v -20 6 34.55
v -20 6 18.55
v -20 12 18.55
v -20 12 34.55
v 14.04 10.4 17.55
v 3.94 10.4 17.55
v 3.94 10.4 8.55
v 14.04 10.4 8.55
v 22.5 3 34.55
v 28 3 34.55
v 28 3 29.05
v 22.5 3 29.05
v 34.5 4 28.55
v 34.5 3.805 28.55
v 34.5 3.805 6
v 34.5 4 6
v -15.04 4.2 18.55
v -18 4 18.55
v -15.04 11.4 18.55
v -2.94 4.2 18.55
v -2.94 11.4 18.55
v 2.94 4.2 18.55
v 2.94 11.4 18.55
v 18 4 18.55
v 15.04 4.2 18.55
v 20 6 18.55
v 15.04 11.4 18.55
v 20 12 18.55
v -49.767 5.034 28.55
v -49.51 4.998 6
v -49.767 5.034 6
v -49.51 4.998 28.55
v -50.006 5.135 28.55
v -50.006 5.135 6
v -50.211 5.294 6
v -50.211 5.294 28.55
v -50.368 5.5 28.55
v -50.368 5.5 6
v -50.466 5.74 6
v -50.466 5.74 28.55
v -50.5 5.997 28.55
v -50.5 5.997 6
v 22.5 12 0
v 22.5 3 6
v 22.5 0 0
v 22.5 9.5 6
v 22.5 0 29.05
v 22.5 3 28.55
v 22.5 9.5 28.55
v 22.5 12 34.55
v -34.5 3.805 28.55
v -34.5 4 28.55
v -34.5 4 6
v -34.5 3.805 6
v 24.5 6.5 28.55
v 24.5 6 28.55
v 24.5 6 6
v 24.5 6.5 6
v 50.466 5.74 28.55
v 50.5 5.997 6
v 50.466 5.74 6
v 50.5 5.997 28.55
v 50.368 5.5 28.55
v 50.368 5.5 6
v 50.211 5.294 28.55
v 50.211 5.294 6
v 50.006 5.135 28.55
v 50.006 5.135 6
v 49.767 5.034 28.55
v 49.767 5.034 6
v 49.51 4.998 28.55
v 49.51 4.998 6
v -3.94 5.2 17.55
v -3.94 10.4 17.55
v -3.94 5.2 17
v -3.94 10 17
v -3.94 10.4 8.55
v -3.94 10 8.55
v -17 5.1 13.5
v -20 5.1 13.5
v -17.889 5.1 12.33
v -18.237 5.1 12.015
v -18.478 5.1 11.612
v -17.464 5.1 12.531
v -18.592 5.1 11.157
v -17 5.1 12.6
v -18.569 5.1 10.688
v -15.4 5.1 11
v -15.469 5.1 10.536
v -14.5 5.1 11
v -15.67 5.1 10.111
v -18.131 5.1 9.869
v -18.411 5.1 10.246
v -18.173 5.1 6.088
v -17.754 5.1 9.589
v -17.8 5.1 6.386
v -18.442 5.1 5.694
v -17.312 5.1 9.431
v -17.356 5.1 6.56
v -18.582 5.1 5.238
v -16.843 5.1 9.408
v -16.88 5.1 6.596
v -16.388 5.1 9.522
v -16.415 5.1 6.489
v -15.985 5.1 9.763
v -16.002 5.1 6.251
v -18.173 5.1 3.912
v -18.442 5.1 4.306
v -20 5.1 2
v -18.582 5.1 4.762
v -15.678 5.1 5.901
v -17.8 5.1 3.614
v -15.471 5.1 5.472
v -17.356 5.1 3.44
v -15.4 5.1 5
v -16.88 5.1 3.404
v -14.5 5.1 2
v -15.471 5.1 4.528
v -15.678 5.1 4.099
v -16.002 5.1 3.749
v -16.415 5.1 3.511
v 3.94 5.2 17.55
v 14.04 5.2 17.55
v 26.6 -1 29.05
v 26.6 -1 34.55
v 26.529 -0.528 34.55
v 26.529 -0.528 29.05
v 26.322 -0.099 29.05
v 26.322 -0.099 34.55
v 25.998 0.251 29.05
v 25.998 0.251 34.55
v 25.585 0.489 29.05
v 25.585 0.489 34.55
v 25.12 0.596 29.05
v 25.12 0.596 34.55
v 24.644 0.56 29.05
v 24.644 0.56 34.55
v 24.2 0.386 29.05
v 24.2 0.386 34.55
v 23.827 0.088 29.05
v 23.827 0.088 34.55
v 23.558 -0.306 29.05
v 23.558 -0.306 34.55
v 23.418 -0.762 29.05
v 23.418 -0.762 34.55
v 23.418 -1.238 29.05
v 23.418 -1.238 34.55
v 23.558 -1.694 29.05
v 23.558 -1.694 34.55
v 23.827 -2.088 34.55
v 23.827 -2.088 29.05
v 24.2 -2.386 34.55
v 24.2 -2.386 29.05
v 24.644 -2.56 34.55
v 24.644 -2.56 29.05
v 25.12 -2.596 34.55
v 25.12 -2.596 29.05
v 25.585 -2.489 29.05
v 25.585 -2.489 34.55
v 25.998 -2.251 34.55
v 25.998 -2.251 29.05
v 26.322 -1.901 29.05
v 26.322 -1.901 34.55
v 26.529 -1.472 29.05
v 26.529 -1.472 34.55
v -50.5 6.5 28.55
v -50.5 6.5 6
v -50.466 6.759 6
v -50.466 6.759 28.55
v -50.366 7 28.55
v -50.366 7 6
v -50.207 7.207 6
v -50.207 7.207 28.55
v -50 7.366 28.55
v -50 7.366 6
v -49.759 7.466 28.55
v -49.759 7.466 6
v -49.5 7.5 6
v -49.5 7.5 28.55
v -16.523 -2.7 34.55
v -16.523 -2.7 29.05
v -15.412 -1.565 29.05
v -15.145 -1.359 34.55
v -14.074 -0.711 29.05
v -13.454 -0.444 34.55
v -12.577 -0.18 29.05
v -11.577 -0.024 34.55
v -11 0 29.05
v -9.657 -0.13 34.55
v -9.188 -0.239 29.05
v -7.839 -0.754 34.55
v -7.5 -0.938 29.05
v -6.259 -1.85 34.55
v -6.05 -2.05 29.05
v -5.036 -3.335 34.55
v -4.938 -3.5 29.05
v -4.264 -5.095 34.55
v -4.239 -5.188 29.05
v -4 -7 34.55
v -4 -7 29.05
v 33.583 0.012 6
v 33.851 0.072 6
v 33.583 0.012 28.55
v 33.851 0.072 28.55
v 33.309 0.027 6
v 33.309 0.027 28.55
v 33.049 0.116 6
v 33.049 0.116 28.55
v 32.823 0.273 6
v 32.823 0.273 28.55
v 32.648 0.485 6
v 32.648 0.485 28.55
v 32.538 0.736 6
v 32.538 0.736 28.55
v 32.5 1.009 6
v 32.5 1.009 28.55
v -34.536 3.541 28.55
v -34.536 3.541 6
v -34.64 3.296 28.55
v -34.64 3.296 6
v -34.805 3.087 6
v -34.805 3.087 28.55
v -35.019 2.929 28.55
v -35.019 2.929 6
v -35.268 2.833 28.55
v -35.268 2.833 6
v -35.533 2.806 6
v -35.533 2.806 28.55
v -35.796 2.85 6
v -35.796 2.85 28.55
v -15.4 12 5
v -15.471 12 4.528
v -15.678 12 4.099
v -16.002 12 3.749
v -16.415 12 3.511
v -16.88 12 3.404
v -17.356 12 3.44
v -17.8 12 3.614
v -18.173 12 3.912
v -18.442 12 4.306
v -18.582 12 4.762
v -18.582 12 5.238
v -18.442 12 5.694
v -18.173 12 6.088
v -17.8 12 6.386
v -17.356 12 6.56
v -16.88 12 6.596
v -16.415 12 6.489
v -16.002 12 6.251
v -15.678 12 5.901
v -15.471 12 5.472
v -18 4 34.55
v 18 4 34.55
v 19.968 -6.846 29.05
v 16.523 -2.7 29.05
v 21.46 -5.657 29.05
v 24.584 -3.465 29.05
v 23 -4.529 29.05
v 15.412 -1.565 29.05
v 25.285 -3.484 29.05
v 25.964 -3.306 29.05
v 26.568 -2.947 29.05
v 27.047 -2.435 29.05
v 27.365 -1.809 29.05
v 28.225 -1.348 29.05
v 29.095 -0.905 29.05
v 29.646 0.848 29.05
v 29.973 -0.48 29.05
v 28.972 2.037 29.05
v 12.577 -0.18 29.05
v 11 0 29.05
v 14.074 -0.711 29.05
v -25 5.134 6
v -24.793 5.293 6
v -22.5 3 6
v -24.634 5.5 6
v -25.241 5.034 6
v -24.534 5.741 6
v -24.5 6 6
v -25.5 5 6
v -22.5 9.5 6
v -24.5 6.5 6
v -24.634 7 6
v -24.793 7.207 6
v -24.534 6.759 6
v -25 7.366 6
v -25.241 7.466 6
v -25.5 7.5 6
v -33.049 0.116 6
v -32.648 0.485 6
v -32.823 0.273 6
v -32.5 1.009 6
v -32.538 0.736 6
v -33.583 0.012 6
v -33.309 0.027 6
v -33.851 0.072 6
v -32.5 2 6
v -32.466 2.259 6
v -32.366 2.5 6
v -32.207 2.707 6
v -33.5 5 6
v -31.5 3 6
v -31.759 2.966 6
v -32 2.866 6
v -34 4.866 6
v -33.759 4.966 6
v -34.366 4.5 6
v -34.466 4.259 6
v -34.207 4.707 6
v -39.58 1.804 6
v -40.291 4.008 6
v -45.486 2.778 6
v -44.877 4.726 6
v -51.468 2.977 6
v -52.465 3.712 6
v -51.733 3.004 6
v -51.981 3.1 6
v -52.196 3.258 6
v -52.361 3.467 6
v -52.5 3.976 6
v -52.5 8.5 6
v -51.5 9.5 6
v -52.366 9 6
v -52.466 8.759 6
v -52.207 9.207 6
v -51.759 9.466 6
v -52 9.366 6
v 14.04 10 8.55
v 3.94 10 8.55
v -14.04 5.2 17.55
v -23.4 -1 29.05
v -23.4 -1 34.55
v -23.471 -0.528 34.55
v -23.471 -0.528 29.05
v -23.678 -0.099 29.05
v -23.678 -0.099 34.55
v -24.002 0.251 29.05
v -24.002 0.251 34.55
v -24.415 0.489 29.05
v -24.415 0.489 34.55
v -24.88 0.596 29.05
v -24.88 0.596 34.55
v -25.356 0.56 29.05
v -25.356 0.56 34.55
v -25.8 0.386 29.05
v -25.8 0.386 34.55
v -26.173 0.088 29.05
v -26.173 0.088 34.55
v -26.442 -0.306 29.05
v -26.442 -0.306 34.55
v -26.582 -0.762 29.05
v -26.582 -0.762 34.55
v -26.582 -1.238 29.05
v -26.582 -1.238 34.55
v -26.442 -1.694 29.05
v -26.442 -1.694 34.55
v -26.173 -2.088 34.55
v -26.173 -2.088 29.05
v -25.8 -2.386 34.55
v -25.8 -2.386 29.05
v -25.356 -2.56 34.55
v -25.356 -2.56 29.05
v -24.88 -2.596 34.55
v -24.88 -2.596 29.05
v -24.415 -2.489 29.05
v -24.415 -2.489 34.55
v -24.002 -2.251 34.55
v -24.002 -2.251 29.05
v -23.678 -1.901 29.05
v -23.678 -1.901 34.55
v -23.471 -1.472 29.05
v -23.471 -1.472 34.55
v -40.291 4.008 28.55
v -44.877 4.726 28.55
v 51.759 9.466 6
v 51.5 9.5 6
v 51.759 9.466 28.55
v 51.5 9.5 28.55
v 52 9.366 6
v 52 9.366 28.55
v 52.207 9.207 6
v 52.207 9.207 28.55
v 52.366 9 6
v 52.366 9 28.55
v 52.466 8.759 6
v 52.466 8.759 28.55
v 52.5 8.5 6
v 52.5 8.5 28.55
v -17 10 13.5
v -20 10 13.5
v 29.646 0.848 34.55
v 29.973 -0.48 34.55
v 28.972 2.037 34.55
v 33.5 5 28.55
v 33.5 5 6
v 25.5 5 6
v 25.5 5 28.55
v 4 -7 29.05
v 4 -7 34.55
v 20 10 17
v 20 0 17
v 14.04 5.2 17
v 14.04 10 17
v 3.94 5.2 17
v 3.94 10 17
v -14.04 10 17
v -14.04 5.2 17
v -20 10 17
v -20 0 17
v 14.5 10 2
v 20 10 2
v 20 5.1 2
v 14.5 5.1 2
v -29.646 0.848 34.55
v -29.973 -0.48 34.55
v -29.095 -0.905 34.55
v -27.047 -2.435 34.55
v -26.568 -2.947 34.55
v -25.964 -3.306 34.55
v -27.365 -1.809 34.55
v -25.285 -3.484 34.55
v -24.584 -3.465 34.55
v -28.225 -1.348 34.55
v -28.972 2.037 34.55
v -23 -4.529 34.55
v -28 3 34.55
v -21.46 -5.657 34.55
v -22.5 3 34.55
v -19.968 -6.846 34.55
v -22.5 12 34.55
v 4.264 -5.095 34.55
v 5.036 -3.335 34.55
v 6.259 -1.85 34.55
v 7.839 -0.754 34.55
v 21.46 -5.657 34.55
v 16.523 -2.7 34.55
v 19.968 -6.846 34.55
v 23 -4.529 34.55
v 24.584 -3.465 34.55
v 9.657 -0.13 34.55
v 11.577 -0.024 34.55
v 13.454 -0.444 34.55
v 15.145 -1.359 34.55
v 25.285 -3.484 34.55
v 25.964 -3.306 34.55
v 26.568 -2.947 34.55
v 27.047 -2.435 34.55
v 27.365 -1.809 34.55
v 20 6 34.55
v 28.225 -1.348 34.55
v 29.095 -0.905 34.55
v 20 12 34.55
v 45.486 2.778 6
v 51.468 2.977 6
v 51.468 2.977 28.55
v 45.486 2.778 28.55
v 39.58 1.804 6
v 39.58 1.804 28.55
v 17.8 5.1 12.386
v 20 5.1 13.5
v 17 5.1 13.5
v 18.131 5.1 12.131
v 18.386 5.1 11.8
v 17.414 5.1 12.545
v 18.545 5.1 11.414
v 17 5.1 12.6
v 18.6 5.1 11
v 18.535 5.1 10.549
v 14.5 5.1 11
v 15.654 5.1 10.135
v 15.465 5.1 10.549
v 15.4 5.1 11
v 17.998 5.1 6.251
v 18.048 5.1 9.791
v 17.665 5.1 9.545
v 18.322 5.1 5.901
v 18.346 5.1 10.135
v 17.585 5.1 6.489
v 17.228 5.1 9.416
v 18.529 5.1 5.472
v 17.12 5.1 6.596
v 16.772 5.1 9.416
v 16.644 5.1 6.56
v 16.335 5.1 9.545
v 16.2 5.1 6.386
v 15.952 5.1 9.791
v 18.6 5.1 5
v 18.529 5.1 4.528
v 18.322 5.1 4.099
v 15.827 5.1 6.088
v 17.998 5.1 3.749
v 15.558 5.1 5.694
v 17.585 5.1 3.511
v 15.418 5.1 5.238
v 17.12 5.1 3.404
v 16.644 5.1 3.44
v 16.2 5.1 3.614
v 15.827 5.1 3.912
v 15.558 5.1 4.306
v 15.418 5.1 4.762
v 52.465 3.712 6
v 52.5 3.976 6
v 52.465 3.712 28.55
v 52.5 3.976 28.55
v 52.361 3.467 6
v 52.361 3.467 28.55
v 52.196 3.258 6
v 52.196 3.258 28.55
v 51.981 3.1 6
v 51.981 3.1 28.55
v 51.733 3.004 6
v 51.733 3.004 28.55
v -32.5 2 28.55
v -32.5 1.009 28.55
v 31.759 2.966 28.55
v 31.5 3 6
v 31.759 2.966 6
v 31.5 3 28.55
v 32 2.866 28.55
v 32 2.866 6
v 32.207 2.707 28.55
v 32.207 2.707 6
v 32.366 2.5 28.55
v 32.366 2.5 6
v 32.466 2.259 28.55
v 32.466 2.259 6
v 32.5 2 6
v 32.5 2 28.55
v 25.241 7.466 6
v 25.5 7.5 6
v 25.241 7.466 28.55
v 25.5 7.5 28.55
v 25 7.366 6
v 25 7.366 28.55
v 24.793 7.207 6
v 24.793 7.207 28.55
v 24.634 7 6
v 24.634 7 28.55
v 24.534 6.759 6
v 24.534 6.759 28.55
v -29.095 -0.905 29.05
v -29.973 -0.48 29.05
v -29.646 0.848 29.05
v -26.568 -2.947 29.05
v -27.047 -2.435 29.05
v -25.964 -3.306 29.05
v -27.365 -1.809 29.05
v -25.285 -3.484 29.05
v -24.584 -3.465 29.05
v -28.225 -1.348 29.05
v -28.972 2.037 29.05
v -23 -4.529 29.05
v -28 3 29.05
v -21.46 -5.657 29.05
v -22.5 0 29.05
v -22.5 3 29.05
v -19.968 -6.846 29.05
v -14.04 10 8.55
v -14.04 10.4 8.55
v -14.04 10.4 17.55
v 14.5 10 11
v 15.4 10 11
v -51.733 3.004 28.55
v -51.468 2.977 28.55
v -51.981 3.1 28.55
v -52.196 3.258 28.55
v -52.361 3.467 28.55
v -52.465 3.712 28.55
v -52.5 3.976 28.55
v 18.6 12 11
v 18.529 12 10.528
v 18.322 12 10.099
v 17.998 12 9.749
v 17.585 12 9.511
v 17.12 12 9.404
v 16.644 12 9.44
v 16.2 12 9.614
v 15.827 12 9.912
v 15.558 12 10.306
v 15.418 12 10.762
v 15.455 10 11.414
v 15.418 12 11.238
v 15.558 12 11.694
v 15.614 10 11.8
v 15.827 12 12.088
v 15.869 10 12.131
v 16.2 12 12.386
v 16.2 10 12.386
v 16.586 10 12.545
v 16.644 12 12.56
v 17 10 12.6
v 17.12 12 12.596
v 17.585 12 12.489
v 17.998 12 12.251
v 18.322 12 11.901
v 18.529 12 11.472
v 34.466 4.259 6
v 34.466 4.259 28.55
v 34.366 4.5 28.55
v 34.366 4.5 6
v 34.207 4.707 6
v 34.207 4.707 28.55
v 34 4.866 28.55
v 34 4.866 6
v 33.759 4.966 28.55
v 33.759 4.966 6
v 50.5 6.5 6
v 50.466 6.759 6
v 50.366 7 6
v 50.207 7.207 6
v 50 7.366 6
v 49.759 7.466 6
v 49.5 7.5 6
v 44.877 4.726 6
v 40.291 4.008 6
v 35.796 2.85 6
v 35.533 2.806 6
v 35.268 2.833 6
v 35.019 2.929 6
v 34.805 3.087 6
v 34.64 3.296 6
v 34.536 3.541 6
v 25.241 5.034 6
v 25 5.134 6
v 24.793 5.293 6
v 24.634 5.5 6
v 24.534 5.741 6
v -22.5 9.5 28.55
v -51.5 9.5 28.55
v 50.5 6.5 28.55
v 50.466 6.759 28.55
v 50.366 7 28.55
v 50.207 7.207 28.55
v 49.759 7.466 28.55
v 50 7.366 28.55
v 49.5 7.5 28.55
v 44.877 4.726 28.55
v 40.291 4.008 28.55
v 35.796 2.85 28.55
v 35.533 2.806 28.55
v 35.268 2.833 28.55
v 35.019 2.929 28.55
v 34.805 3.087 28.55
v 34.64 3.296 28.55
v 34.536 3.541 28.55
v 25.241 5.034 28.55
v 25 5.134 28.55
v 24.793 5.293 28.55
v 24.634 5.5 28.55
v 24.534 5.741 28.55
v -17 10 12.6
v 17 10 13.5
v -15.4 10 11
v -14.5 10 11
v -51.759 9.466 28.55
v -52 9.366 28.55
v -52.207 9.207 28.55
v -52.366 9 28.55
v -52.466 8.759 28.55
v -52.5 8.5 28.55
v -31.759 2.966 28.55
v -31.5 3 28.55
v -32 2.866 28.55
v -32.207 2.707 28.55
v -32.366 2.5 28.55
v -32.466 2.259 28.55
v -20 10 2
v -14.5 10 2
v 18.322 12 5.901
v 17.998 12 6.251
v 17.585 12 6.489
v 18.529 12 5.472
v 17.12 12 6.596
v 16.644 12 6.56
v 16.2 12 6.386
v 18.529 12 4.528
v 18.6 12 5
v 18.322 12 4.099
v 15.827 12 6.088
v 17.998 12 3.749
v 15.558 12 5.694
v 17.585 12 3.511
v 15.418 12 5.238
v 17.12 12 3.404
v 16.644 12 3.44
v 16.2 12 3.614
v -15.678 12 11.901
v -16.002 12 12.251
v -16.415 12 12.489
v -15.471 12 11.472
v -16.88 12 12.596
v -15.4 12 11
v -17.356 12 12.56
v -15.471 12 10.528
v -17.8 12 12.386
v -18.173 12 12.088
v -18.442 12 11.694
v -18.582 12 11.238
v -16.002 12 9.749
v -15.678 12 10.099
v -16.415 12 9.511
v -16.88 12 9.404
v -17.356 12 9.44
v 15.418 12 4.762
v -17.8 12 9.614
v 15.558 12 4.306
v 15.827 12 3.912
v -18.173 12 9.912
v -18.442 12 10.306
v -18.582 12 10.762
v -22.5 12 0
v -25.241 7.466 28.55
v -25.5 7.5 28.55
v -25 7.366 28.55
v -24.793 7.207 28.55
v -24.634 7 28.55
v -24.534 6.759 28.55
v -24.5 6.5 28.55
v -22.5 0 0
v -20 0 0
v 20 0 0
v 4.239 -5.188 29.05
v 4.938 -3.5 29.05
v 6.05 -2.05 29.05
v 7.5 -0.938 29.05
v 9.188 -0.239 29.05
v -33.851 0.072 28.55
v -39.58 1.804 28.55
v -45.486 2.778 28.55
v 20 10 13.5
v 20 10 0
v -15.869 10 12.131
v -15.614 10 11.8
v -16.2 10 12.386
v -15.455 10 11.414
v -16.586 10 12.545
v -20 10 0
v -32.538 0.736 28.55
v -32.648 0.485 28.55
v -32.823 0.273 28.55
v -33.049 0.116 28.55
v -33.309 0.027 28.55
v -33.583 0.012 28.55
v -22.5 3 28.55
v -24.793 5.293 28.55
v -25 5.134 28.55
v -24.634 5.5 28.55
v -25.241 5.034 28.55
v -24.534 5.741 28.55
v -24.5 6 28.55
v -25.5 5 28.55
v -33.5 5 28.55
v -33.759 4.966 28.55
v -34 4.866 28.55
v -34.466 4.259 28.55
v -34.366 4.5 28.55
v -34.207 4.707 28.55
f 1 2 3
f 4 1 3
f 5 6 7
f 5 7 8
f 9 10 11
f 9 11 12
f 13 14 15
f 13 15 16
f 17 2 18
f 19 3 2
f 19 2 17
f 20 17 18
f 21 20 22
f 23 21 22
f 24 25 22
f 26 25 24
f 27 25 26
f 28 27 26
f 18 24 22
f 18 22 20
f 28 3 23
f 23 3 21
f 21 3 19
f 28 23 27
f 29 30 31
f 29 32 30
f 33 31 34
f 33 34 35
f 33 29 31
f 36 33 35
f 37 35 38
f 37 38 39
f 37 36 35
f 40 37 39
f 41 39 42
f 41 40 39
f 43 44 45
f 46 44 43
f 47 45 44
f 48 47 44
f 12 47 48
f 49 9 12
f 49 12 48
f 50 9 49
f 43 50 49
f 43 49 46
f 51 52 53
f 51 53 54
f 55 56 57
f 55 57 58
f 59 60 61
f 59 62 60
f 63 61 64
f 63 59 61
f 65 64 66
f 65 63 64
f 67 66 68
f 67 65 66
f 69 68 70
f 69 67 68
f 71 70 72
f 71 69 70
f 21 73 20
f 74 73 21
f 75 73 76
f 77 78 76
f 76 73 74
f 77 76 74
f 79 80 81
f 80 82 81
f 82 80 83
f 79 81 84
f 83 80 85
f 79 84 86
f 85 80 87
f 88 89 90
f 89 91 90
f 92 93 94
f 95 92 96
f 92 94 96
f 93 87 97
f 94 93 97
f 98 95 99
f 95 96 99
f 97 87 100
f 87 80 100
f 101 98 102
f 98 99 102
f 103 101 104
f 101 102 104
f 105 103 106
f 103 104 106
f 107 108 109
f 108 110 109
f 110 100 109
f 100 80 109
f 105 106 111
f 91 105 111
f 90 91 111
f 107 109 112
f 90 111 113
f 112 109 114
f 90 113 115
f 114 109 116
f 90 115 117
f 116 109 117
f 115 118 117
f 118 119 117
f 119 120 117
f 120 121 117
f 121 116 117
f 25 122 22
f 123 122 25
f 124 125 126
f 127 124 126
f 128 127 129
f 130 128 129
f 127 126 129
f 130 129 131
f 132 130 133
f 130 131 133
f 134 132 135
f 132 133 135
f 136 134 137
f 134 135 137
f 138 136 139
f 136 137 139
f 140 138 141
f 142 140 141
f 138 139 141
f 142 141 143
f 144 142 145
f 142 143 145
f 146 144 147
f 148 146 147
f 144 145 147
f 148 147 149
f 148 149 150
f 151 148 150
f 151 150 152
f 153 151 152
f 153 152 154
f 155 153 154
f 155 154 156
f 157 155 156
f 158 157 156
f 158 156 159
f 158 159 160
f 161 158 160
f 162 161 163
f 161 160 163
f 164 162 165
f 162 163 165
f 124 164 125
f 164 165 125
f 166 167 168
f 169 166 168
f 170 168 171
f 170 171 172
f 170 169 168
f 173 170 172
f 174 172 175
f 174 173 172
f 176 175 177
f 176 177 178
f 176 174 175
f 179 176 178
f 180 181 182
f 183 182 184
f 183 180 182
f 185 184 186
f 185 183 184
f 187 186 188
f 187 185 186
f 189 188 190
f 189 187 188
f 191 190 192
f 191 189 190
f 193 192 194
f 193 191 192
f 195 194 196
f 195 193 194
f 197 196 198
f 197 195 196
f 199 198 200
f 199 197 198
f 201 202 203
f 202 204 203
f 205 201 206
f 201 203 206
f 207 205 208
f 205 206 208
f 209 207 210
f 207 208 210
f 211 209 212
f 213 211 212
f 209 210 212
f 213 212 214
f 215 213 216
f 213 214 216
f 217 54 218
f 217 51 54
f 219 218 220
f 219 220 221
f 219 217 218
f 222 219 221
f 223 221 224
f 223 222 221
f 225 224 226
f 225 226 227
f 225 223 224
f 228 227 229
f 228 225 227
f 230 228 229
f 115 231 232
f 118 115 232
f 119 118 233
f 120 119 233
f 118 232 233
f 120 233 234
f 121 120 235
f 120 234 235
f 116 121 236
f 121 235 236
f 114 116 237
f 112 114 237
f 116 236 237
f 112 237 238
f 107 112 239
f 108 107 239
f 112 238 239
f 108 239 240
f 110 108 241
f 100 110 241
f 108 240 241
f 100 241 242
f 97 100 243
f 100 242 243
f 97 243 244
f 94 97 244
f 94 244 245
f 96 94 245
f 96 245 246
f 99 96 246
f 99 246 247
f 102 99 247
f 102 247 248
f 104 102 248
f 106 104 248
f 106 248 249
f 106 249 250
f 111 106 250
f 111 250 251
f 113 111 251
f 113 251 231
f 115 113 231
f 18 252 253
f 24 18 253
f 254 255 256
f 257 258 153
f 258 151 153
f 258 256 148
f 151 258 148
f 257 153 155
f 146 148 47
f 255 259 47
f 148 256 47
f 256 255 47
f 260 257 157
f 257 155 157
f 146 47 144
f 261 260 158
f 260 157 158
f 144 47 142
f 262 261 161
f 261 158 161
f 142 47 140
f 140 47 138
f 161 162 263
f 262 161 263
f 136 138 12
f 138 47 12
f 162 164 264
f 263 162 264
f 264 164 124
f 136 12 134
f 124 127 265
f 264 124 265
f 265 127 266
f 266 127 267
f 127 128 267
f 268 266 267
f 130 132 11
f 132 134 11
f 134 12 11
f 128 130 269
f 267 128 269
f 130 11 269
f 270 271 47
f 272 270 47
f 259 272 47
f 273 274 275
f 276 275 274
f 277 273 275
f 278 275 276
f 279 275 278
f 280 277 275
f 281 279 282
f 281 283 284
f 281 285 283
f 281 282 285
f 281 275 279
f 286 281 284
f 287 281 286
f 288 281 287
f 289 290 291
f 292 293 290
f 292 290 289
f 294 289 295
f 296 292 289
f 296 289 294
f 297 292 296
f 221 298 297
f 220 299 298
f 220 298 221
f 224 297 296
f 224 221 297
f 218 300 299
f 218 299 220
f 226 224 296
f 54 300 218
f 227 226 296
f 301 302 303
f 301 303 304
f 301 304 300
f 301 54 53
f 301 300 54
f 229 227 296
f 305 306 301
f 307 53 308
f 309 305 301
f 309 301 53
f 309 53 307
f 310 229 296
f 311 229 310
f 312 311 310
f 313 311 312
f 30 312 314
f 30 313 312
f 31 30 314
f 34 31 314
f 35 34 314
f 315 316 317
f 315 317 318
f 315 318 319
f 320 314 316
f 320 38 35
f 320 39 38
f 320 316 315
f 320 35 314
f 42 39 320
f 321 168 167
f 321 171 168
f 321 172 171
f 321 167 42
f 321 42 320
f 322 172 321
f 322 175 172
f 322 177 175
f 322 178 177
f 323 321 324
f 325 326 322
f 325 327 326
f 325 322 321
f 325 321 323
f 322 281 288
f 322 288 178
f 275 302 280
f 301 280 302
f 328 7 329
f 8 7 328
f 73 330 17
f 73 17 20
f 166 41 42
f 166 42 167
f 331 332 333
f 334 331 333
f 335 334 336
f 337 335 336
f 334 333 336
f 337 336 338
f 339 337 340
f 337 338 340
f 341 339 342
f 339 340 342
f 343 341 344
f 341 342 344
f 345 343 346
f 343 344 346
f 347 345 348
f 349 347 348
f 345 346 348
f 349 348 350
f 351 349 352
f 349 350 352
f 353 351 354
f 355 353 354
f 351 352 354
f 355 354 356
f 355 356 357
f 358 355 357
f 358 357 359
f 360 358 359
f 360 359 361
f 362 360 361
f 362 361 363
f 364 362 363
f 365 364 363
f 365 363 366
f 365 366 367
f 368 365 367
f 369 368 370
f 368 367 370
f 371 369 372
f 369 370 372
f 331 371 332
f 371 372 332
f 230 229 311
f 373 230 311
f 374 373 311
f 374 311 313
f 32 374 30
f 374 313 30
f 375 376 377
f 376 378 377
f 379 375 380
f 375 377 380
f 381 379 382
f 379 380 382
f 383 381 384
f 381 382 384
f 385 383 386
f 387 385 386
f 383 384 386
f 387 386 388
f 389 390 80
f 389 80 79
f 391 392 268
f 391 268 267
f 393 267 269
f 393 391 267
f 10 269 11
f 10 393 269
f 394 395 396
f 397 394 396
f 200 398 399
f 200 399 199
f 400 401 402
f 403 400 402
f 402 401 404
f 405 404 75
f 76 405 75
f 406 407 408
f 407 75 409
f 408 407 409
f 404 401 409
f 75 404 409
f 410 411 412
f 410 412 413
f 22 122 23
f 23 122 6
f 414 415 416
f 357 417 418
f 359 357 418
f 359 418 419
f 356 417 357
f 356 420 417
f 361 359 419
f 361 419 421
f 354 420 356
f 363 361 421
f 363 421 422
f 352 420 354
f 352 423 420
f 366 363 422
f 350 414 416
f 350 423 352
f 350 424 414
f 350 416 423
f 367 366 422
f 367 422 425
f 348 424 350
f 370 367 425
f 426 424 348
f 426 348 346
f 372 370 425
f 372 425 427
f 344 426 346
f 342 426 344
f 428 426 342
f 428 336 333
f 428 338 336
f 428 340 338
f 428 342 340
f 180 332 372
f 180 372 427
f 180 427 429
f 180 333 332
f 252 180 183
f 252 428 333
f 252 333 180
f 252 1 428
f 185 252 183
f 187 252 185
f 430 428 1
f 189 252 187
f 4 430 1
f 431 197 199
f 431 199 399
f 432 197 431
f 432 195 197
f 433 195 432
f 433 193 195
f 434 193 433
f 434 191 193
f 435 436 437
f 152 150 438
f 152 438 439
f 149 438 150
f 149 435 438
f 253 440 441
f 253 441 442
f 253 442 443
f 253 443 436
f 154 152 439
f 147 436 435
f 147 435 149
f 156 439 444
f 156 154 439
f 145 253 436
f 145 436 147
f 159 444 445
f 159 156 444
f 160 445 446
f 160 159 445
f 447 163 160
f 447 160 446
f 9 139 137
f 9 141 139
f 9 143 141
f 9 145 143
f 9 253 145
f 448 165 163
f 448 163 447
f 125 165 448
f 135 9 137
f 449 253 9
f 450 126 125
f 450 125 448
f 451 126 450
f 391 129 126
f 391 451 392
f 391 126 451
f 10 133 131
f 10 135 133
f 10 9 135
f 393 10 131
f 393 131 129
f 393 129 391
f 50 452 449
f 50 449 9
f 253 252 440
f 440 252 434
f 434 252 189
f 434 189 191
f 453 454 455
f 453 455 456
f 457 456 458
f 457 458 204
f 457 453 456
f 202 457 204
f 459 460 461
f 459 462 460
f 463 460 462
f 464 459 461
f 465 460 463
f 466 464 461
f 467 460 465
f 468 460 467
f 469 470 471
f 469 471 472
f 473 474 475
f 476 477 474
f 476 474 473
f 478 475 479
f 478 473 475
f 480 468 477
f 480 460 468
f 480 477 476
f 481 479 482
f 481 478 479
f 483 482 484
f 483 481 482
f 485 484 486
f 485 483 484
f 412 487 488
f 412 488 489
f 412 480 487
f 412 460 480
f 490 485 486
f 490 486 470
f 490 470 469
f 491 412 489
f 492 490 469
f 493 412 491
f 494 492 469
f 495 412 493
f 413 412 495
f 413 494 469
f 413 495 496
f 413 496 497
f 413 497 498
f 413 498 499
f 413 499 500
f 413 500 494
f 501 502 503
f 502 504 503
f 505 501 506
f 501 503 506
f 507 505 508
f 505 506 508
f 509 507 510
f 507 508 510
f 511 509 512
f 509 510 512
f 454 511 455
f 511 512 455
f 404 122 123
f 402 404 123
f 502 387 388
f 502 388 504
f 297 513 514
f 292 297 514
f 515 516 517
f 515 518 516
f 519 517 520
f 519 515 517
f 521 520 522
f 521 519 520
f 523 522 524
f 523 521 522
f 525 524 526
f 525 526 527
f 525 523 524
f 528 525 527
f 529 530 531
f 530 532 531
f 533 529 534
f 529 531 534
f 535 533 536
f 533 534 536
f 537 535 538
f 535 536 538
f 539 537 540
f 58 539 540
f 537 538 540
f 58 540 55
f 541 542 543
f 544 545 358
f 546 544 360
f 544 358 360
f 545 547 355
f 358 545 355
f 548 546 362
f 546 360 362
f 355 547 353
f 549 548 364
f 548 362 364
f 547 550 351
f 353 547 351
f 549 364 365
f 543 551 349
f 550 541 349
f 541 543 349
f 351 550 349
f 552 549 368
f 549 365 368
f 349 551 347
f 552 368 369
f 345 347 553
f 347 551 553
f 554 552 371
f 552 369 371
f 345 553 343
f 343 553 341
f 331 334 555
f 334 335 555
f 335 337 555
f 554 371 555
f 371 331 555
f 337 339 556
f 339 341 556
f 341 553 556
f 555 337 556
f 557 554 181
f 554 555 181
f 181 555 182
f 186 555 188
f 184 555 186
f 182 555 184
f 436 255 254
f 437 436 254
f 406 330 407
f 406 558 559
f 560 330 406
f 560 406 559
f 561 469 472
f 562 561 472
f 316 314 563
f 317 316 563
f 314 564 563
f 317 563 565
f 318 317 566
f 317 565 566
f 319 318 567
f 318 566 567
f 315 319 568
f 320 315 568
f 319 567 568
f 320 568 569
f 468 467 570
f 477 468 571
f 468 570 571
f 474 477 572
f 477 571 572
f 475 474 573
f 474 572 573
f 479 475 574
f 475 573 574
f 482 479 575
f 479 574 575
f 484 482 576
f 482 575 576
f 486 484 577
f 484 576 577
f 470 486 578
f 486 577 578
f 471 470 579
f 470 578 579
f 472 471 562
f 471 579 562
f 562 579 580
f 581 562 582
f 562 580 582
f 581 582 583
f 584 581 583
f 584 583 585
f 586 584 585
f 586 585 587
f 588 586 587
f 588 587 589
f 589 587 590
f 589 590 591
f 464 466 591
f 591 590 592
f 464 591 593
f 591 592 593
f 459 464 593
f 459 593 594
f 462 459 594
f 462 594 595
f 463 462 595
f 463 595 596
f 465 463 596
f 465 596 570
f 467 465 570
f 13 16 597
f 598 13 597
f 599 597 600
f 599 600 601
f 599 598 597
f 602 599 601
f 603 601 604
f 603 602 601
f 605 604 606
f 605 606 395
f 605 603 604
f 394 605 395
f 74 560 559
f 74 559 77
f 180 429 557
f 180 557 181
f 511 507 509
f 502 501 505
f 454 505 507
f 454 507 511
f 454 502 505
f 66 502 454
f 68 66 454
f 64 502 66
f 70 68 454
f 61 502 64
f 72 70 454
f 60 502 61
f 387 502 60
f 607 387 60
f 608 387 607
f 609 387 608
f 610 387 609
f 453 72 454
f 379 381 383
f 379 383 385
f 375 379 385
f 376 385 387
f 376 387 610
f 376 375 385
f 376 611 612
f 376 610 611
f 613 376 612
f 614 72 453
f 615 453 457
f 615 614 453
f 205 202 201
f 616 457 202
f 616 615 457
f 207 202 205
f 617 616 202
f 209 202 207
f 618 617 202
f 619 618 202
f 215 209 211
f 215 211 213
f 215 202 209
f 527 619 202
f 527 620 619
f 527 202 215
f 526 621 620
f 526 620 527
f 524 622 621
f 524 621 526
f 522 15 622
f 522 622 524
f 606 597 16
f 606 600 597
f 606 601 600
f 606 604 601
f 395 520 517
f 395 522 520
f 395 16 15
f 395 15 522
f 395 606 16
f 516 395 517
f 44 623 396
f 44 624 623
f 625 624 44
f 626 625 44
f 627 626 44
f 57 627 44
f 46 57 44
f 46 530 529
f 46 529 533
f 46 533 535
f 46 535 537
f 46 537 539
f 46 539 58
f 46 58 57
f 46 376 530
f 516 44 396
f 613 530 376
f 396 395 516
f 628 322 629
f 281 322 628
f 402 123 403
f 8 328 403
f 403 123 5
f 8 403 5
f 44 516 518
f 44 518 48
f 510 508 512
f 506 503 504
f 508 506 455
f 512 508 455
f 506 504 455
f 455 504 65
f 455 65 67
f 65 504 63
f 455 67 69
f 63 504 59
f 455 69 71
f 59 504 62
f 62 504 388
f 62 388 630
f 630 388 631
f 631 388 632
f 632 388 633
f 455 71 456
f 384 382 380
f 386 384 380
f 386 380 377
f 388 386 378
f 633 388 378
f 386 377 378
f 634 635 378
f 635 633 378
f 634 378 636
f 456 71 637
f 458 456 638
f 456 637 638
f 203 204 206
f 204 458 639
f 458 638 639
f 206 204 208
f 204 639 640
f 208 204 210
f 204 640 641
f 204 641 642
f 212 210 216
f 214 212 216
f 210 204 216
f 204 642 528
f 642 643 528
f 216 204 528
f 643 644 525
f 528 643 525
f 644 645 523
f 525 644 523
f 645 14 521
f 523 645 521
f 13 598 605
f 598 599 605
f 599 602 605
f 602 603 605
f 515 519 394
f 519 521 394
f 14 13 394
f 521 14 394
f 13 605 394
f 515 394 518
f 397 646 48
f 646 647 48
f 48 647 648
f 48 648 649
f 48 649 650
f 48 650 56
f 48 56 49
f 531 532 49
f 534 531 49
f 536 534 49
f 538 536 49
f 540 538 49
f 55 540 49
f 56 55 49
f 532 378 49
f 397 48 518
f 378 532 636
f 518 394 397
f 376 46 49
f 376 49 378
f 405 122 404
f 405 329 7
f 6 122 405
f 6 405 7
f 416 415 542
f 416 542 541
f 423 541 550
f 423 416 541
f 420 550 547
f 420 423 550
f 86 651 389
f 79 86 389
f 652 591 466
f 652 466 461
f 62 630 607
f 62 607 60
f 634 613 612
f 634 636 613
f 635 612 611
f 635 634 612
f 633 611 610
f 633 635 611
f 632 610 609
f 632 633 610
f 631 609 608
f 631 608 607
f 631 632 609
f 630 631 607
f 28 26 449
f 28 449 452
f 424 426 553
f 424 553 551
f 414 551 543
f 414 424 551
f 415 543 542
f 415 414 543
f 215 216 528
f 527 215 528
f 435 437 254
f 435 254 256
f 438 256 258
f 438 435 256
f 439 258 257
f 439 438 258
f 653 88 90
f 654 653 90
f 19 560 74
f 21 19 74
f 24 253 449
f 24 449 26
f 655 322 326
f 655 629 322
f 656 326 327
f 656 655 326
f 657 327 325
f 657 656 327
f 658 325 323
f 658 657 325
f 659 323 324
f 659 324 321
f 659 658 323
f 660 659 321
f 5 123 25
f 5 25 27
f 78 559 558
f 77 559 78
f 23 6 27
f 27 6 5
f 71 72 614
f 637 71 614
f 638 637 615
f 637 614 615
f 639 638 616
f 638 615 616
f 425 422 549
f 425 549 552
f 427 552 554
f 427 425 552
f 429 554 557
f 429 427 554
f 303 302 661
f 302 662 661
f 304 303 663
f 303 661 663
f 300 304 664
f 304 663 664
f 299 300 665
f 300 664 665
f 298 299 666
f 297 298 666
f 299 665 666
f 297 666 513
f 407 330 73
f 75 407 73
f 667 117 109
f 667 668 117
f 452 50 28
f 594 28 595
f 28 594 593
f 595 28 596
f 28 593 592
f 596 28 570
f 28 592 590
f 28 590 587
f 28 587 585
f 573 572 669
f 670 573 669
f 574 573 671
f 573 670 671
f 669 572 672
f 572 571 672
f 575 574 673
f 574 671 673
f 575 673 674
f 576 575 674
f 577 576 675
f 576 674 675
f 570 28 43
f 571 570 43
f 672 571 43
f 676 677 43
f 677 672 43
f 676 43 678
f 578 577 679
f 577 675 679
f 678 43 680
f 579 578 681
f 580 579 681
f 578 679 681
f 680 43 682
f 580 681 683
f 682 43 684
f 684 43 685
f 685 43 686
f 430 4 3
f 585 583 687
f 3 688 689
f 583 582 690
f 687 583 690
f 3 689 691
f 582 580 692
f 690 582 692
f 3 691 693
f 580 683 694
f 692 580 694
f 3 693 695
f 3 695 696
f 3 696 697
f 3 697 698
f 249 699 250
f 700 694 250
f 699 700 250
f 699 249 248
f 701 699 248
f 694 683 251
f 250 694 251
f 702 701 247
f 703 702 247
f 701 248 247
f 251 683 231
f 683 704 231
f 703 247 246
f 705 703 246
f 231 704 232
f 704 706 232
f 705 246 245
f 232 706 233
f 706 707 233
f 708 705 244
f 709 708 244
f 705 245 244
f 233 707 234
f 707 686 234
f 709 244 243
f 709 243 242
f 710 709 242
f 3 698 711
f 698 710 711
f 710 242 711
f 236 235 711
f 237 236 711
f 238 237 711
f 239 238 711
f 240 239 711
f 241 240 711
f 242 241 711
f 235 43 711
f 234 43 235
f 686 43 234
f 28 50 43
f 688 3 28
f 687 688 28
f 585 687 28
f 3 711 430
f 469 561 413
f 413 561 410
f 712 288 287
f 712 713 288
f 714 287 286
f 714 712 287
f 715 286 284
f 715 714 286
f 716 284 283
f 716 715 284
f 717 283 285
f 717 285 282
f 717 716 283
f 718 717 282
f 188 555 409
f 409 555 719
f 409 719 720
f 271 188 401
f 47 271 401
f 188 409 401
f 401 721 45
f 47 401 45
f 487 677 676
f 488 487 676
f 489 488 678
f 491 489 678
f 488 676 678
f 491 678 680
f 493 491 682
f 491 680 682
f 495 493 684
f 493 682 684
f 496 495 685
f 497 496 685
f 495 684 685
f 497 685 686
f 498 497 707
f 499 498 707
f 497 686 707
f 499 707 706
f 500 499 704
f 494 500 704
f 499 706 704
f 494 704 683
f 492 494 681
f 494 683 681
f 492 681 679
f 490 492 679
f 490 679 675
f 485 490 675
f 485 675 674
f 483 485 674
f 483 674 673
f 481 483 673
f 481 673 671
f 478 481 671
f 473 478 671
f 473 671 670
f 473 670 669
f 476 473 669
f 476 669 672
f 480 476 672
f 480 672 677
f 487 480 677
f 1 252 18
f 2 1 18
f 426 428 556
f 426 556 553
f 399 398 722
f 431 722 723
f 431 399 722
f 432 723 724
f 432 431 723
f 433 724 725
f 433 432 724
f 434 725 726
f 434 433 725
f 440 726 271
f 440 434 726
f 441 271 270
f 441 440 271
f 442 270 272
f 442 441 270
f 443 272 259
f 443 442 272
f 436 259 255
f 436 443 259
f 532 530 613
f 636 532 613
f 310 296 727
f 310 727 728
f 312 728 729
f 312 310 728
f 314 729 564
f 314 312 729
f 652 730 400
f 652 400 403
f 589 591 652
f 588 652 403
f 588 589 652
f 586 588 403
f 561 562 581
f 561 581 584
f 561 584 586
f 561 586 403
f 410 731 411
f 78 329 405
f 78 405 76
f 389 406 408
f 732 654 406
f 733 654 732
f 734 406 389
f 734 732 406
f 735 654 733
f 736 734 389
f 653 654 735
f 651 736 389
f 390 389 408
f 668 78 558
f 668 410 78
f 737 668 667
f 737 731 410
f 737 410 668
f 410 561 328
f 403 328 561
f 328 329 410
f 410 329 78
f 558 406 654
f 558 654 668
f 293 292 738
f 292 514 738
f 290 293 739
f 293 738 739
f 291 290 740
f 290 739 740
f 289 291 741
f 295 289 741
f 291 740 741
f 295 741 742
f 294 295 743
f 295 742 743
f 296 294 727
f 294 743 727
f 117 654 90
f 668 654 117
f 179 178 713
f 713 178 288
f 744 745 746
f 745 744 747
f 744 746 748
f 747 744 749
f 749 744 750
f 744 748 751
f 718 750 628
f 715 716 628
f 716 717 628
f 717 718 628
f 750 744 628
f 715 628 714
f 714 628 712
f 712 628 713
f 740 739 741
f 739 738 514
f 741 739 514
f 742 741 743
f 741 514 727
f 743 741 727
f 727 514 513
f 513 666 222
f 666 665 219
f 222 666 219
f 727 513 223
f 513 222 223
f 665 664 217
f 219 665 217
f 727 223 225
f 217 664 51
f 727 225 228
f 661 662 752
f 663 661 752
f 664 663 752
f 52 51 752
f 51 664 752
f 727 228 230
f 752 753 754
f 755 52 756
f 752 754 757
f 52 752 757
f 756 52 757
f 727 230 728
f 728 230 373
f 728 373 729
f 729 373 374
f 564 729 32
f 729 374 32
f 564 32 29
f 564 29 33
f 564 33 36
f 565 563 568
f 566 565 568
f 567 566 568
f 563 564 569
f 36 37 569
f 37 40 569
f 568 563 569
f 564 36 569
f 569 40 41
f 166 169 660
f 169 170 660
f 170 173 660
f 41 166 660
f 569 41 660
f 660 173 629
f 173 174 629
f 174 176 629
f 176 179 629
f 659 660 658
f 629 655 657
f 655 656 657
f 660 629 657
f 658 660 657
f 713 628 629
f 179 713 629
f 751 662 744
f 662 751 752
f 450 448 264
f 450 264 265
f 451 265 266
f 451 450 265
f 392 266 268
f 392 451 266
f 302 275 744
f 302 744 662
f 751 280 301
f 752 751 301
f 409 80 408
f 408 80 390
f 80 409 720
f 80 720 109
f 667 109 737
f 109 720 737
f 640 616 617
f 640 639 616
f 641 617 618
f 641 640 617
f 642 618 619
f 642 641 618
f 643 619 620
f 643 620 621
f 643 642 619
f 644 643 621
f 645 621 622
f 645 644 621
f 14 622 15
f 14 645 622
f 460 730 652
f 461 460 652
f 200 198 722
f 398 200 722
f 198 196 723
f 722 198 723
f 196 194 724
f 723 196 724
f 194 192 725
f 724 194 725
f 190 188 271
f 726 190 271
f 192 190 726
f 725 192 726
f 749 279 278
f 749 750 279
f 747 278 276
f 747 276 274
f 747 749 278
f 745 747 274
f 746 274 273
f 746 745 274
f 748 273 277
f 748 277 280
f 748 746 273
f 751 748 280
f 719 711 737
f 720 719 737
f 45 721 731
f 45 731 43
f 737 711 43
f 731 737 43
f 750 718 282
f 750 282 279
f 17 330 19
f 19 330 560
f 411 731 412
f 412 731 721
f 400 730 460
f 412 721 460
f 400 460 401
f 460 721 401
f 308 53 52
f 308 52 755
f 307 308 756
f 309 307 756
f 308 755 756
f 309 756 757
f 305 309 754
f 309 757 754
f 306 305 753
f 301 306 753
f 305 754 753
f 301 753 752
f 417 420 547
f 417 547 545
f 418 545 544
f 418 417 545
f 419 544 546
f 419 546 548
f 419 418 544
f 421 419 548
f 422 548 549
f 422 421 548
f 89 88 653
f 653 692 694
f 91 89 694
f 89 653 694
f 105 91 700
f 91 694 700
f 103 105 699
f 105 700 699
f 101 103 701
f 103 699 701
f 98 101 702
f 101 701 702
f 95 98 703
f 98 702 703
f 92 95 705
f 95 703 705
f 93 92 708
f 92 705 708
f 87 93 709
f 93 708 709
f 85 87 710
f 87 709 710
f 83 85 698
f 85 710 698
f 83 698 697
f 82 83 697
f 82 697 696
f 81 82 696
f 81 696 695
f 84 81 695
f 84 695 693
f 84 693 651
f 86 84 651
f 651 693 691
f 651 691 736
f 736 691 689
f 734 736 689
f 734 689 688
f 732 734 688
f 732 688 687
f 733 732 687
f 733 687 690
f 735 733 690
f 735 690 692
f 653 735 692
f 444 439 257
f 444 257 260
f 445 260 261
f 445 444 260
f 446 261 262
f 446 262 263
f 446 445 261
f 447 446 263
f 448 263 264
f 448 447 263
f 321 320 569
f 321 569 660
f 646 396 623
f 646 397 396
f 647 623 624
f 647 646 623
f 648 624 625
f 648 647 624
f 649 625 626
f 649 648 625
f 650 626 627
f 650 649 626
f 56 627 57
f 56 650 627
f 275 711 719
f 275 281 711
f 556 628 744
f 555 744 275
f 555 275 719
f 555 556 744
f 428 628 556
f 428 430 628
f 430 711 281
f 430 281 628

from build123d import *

# Parameters (mm, degrees)
EXTRUDE_1_DEPTH     = 34.55
SKETCH_2_W          = 40
SKETCH_2_H          = 8
CUT_EXTRUDE_1_DEPTH = 16
CUT_EXTRUDE_2_DEPTH = 10
SKETCH_4_W          = 10.1
SKETCH_4_H          = 5.2
CUT_EXTRUDE_3_DEPTH = 10
CHAMFER_1_SIZE      = 2
CHAMFER_2_SIZE      = 1
SKETCH_6_R          = 1.6
EXTRUDE_2_DEPTH     = 6.9
SKETCH_7_R          = 1.6
CUT_EXTRUDE_4_DEPTH = 10
SKETCH_8_R          = 1.6
EXTRUDE_3_DEPTH     = 5.5
SKETCH_10_W         = 40
SKETCH_10_H         = 10
CUT_EXTRUDE_5_DEPTH = 2
CUT_EXTRUDE_6_DEPTH = 10
SKETCH_12_W         = 34
SKETCH_12_H         = 2.5
CUT_EXTRUDE_7_DEPTH = 4.9
EXTRUDE_START       = -6
EXTRUDE_4_DEPTH     = 22.55
FILLET_1_R          = 1


with BuildPart() as part:
    # 草图1 → 凸台-拉伸1 (new body)
    with BuildSketch(Plane.XY):
        Polygon((0, 0), (22.5, 0), (22.5, 12), (-22.5, 12), (-22.5, 0), align=None)
    extrude(amount=EXTRUDE_1_DEPTH)

    # 草图2 → 切除-拉伸1 (cut)
    with BuildSketch(Plane.XY.offset(34.55)):
        with Locations((0, 8)):
            Rectangle(SKETCH_2_W, SKETCH_2_H)
    extrude(amount=-CUT_EXTRUDE_1_DEPTH, mode=Mode.SUBTRACT)

    # 草图3 → 切除-拉伸2 (cut)
    with BuildSketch(Plane.XZ):
        Polygon((0, 2), (20, 2), (20, 17), (-20, 17), (-20, 2), align=None)
    extrude(amount=-CUT_EXTRUDE_2_DEPTH, mode=Mode.SUBTRACT)

    # 草图4 → 切除-拉伸3 (cut)
    with BuildSketch(Plane.XY.offset(18.55)):
        with Locations((-8.99, 7.8)):
            Rectangle(SKETCH_4_W, SKETCH_4_H)
        with Locations((8.99, 7.8)):
            Rectangle(SKETCH_4_W, SKETCH_4_H)
    extrude(amount=-CUT_EXTRUDE_3_DEPTH, mode=Mode.SUBTRACT)

    # 倒角1
    chamfer_1_edges = [part.edges().sort_by_distance(p)[0] for p in [
        (20, 4, 26.55),
        (-20, 4, 26.55),
    ]]
    chamfer(chamfer_1_edges, length=CHAMFER_1_SIZE)

    # 倒角2
    chamfer_2_edges = [part.edges().sort_by_distance(p)[0] for p in [
        (-8.99, 10.4, 18.55),
        (-14.04, 7.8, 18.55),
        (-8.99, 5.2, 18.55),
        (-3.94, 7.8, 18.55),
        (3.94, 7.8, 18.55),
        (8.99, 5.2, 18.55),
        (14.04, 7.8, 18.55),
        (8.99, 10.4, 18.55),
    ]]
    chamfer(chamfer_2_edges, length=CHAMFER_2_SIZE)

    # 草图6 → 凸台-拉伸2 (add)
    with BuildSketch(Plane(origin=(0, 12, 0), x_dir=(1, 0, 0), z_dir=(0, 1, 0))):
        with BuildLine():
            Line((22.5, 0), (22.5, -13.5))
            Line((22.5, -13.5), (17, -13.5))
            ThreePointArc((17, -13.5), (15.232233047, -12.767766953), (14.5, -11))
            Line((14.5, -11), (14.5, -5))
            Line((14.5, -5), (14.5, 0))
            Line((14.5, 0), (22.5, 0))
        make_face()
        with Locations((17, -5)):
            Circle(SKETCH_6_R, mode=Mode.SUBTRACT)
        with Locations((17, -11)):
            Circle(SKETCH_6_R, mode=Mode.SUBTRACT)
        with BuildLine():
            Line((-14.5, 0), (-22.5, 0))
            Line((-22.5, 0), (-22.5, -13.5))
            Line((-22.5, -13.5), (-17, -13.5))
            ThreePointArc((-17, -13.5), (-15.232233047, -12.767766953), (-14.5, -11))
            Line((-14.5, -11), (-14.5, -5))
            Line((-14.5, -5), (-14.5, 0))
        make_face()
        with Locations((-17, -11)):
            Circle(SKETCH_6_R, mode=Mode.SUBTRACT)
        with Locations((-17, -5)):
            Circle(SKETCH_6_R, mode=Mode.SUBTRACT)
    extrude(amount=-EXTRUDE_2_DEPTH)

    # 草图7 → 切除-拉伸4 (cut)
    with BuildSketch(Plane(origin=(0, 12, 0), x_dir=(1, 0, 0), z_dir=(0, 1, 0))):
        with Locations((17, -5)):
            Circle(SKETCH_7_R)
        with Locations((17, -11)):
            Circle(SKETCH_7_R)
        with Locations((-17, -5)):
            Circle(SKETCH_7_R)
        with Locations((-17, -11)):
            Circle(SKETCH_7_R)
    extrude(amount=-CUT_EXTRUDE_4_DEPTH, mode=Mode.SUBTRACT)

    # 草图8 → 凸台-拉伸3 (add)
    with BuildSketch(Plane.XY.offset(34.55)):
        with BuildLine():
            Line((1.843049286, -25.367101461), (9.230566594, -19.615105309))
            ThreePointArc((9.230566594, -19.615105309), (9.814108465, -18.625953935), (10.421644381, -17.651355727))
            Line((10.421644381, -17.651355727), (5.476763257, -11.300448334))
            ThreePointArc((5.476763257, -11.300448334), (6.699551666, -1.476763257), (16.523236743, -2.699551666))
            Line((16.523236743, -2.699551666), (19.967990067, -6.846461039))
            ThreePointArc((19.967990067, -6.846461039), (22.224318463, -5.085470923), (24.58365332, -3.465087309))
            ThreePointArc((24.58365332, -3.465087309), (26.278709649, -3.148232211), (27.365383934, -1.809295278))
            ThreePointArc((27.365383934, -1.809295278), (28.658809968, -1.124546474), (29.972928279, -0.480399834))
            ThreePointArc((29.972928279, -0.480399834), (29.349734714, 1.46572665), (28, 3))
            Line((28, 3), (22.5, 3))
            Line((22.5, 3), (22.5, 4))
            Line((22.5, 4), (-22.5, 4))
            Line((-22.5, 4), (-22.5, 3))
            Line((-22.5, 3), (-28, 3))
            ThreePointArc((-28, 3), (-29.349734714, 1.46572665), (-29.972928279, -0.480399834))
            ThreePointArc((-29.972928279, -0.480399834), (-28.658809968, -1.124546474), (-27.365383934, -1.809295278))
            ThreePointArc((-27.365383934, -1.809295278), (-26.278709649, -3.148232211), (-24.58365332, -3.465087309))
            ThreePointArc((-24.58365332, -3.465087309), (-22.224318463, -5.085470923), (-19.967990067, -6.846461039))
            Line((-19.967990067, -6.846461039), (-16.523236743, -2.699551666))
            ThreePointArc((-16.523236743, -2.699551666), (-6.699551666, -1.476763257), (-5.476763257, -11.300448334))
            Line((-5.476763257, -11.300448334), (-10.421644381, -17.651355727))
            ThreePointArc((-10.421644381, -17.651355727), (-9.814108465, -18.625953935), (-9.230566594, -19.615105309))
            Line((-9.230566594, -19.615105309), (-1.843049286, -25.367101461))
            ThreePointArc((-1.843049286, -25.367101461), (0, -26), (1.843049286, -25.367101461))
        make_face()
        with Locations((25, -1)):
            Circle(SKETCH_8_R, mode=Mode.SUBTRACT)
        with Locations((0, -23)):
            Circle(SKETCH_8_R, mode=Mode.SUBTRACT)
        with Locations((-25, -1)):
            Circle(SKETCH_8_R, mode=Mode.SUBTRACT)
    extrude(amount=-EXTRUDE_3_DEPTH)

    # 草图10 → 切除-拉伸5 (cut)
    with BuildSketch(Plane(origin=(0, 0, 0), x_dir=(-1, 0, 0), z_dir=(0, 0, -1))):
        with Locations((0, 5)):
            Rectangle(SKETCH_10_W, SKETCH_10_H)
    extrude(amount=-CUT_EXTRUDE_5_DEPTH, mode=Mode.SUBTRACT)

    # 草图11 → 切除-拉伸6 (cut)
    with BuildSketch(Plane(origin=(0, 0, 29.05), x_dir=(-1, 0, 0), z_dir=(0, 0, -1))):
        Polygon((-4, -7), (4, -7), (10.421644381, -17.651355727), (10.421644381, -27.0891889), (-10.421644381, -27.0891889), (-10.421644381, -17.651355727), align=None)
    extrude(amount=-CUT_EXTRUDE_6_DEPTH, mode=Mode.SUBTRACT)

    # 草图12 → 切除-拉伸7 (cut)
    with BuildSketch(Plane.XZ.offset(-5.1)):
        with Locations((0, 12.25)):
            Rectangle(SKETCH_12_W, SKETCH_12_H)
    extrude(amount=-CUT_EXTRUDE_7_DEPTH, mode=Mode.SUBTRACT)

    # 草图14 → 凸台-拉伸4 (add)
    with BuildSketch(Plane(origin=(0, 0, 0), x_dir=(-1, 0, 0), z_dir=(0, 0, -1)).offset(EXTRUDE_START)):
        with BuildLine():
            Line((-22.5, 9.5), (-52.5, 9.5))
            Line((-52.5, 9.5), (-52.5, 2.932014979))
            ThreePointArc((-52.5, 2.932014979), (-42.310755549, 2.352789548), (-32.5, -0.458843457))
            Line((-32.5, -0.458843457), (-32.5, 3))
            Line((-32.5, 3), (-22.5, 3))
            Line((-22.5, 3), (-22.5, 9.5))
        make_face()
        with BuildLine():
            Line((-24.5, 7.5), (-50.5, 7.5))
            Line((-50.5, 7.5), (-50.5, 4.997395763))
            ThreePointArc((-50.5, 4.997395763), (-42.390809061, 4.393039713), (-34.5, 2.428515274))
            Line((-34.5, 2.428515274), (-34.5, 5))
            Line((-34.5, 5), (-24.5, 5))
            Line((-24.5, 5), (-24.5, 7.5))
        make_face(mode=Mode.SUBTRACT)
        with BuildLine():
            Line((32.5, 3), (32.5, -0.458843457))
            ThreePointArc((32.5, -0.458843457), (42.310755549, 2.352789548), (52.5, 2.932014979))
            Line((52.5, 2.932014979), (52.5, 9.5))
            Line((52.5, 9.5), (22.5, 9.5))
            Line((22.5, 9.5), (22.5, 3))
            Line((22.5, 3), (32.5, 3))
        make_face()
        with BuildLine():
            Line((34.5, 5), (34.5, 2.428515274))
            ThreePointArc((34.5, 2.428515274), (42.390809061, 4.393039713), (50.5, 4.997395763))
            Line((50.5, 4.997395763), (50.5, 7.5))
            Line((50.5, 7.5), (24.5, 7.5))
            Line((24.5, 7.5), (24.5, 5))
            Line((24.5, 5), (34.5, 5))
        make_face(mode=Mode.SUBTRACT)
    extrude(amount=-EXTRUDE_4_DEPTH)

    # 圆角1
    fillet_1_edges = [part.edges().sort_by_distance(p)[0] for p in [
        (32.5, 3, 17.275),
        (32.5, -0.458843457, 17.275),
        (52.5, 2.932014979, 17.275),
        (52.5, 9.5, 17.275),
        (24.5, 5, 17.275),
        (34.5, 5, 17.275),
        (34.5, 2.428515274, 17.275),
        (50.5, 4.997395763, 17.275),
        (50.5, 7.5, 17.275),
        (24.5, 7.5, 17.275),
        (-52.5, 2.932014979, 17.275),
        (-32.5, -0.458843457, 17.275),
        (-32.5, 3, 17.275),
        (-52.5, 9.5, 17.275),
        (-24.5, 5, 17.275),
        (-24.5, 7.5, 17.275),
        (-50.5, 7.5, 17.275),
        (-50.5, 4.997395763, 17.275),
        (-34.5, 2.428515274, 17.275),
        (-34.5, 5, 17.275),
    ]]
    fillet(fillet_1_edges, radius=FILLET_1_R)


solid = part.part
